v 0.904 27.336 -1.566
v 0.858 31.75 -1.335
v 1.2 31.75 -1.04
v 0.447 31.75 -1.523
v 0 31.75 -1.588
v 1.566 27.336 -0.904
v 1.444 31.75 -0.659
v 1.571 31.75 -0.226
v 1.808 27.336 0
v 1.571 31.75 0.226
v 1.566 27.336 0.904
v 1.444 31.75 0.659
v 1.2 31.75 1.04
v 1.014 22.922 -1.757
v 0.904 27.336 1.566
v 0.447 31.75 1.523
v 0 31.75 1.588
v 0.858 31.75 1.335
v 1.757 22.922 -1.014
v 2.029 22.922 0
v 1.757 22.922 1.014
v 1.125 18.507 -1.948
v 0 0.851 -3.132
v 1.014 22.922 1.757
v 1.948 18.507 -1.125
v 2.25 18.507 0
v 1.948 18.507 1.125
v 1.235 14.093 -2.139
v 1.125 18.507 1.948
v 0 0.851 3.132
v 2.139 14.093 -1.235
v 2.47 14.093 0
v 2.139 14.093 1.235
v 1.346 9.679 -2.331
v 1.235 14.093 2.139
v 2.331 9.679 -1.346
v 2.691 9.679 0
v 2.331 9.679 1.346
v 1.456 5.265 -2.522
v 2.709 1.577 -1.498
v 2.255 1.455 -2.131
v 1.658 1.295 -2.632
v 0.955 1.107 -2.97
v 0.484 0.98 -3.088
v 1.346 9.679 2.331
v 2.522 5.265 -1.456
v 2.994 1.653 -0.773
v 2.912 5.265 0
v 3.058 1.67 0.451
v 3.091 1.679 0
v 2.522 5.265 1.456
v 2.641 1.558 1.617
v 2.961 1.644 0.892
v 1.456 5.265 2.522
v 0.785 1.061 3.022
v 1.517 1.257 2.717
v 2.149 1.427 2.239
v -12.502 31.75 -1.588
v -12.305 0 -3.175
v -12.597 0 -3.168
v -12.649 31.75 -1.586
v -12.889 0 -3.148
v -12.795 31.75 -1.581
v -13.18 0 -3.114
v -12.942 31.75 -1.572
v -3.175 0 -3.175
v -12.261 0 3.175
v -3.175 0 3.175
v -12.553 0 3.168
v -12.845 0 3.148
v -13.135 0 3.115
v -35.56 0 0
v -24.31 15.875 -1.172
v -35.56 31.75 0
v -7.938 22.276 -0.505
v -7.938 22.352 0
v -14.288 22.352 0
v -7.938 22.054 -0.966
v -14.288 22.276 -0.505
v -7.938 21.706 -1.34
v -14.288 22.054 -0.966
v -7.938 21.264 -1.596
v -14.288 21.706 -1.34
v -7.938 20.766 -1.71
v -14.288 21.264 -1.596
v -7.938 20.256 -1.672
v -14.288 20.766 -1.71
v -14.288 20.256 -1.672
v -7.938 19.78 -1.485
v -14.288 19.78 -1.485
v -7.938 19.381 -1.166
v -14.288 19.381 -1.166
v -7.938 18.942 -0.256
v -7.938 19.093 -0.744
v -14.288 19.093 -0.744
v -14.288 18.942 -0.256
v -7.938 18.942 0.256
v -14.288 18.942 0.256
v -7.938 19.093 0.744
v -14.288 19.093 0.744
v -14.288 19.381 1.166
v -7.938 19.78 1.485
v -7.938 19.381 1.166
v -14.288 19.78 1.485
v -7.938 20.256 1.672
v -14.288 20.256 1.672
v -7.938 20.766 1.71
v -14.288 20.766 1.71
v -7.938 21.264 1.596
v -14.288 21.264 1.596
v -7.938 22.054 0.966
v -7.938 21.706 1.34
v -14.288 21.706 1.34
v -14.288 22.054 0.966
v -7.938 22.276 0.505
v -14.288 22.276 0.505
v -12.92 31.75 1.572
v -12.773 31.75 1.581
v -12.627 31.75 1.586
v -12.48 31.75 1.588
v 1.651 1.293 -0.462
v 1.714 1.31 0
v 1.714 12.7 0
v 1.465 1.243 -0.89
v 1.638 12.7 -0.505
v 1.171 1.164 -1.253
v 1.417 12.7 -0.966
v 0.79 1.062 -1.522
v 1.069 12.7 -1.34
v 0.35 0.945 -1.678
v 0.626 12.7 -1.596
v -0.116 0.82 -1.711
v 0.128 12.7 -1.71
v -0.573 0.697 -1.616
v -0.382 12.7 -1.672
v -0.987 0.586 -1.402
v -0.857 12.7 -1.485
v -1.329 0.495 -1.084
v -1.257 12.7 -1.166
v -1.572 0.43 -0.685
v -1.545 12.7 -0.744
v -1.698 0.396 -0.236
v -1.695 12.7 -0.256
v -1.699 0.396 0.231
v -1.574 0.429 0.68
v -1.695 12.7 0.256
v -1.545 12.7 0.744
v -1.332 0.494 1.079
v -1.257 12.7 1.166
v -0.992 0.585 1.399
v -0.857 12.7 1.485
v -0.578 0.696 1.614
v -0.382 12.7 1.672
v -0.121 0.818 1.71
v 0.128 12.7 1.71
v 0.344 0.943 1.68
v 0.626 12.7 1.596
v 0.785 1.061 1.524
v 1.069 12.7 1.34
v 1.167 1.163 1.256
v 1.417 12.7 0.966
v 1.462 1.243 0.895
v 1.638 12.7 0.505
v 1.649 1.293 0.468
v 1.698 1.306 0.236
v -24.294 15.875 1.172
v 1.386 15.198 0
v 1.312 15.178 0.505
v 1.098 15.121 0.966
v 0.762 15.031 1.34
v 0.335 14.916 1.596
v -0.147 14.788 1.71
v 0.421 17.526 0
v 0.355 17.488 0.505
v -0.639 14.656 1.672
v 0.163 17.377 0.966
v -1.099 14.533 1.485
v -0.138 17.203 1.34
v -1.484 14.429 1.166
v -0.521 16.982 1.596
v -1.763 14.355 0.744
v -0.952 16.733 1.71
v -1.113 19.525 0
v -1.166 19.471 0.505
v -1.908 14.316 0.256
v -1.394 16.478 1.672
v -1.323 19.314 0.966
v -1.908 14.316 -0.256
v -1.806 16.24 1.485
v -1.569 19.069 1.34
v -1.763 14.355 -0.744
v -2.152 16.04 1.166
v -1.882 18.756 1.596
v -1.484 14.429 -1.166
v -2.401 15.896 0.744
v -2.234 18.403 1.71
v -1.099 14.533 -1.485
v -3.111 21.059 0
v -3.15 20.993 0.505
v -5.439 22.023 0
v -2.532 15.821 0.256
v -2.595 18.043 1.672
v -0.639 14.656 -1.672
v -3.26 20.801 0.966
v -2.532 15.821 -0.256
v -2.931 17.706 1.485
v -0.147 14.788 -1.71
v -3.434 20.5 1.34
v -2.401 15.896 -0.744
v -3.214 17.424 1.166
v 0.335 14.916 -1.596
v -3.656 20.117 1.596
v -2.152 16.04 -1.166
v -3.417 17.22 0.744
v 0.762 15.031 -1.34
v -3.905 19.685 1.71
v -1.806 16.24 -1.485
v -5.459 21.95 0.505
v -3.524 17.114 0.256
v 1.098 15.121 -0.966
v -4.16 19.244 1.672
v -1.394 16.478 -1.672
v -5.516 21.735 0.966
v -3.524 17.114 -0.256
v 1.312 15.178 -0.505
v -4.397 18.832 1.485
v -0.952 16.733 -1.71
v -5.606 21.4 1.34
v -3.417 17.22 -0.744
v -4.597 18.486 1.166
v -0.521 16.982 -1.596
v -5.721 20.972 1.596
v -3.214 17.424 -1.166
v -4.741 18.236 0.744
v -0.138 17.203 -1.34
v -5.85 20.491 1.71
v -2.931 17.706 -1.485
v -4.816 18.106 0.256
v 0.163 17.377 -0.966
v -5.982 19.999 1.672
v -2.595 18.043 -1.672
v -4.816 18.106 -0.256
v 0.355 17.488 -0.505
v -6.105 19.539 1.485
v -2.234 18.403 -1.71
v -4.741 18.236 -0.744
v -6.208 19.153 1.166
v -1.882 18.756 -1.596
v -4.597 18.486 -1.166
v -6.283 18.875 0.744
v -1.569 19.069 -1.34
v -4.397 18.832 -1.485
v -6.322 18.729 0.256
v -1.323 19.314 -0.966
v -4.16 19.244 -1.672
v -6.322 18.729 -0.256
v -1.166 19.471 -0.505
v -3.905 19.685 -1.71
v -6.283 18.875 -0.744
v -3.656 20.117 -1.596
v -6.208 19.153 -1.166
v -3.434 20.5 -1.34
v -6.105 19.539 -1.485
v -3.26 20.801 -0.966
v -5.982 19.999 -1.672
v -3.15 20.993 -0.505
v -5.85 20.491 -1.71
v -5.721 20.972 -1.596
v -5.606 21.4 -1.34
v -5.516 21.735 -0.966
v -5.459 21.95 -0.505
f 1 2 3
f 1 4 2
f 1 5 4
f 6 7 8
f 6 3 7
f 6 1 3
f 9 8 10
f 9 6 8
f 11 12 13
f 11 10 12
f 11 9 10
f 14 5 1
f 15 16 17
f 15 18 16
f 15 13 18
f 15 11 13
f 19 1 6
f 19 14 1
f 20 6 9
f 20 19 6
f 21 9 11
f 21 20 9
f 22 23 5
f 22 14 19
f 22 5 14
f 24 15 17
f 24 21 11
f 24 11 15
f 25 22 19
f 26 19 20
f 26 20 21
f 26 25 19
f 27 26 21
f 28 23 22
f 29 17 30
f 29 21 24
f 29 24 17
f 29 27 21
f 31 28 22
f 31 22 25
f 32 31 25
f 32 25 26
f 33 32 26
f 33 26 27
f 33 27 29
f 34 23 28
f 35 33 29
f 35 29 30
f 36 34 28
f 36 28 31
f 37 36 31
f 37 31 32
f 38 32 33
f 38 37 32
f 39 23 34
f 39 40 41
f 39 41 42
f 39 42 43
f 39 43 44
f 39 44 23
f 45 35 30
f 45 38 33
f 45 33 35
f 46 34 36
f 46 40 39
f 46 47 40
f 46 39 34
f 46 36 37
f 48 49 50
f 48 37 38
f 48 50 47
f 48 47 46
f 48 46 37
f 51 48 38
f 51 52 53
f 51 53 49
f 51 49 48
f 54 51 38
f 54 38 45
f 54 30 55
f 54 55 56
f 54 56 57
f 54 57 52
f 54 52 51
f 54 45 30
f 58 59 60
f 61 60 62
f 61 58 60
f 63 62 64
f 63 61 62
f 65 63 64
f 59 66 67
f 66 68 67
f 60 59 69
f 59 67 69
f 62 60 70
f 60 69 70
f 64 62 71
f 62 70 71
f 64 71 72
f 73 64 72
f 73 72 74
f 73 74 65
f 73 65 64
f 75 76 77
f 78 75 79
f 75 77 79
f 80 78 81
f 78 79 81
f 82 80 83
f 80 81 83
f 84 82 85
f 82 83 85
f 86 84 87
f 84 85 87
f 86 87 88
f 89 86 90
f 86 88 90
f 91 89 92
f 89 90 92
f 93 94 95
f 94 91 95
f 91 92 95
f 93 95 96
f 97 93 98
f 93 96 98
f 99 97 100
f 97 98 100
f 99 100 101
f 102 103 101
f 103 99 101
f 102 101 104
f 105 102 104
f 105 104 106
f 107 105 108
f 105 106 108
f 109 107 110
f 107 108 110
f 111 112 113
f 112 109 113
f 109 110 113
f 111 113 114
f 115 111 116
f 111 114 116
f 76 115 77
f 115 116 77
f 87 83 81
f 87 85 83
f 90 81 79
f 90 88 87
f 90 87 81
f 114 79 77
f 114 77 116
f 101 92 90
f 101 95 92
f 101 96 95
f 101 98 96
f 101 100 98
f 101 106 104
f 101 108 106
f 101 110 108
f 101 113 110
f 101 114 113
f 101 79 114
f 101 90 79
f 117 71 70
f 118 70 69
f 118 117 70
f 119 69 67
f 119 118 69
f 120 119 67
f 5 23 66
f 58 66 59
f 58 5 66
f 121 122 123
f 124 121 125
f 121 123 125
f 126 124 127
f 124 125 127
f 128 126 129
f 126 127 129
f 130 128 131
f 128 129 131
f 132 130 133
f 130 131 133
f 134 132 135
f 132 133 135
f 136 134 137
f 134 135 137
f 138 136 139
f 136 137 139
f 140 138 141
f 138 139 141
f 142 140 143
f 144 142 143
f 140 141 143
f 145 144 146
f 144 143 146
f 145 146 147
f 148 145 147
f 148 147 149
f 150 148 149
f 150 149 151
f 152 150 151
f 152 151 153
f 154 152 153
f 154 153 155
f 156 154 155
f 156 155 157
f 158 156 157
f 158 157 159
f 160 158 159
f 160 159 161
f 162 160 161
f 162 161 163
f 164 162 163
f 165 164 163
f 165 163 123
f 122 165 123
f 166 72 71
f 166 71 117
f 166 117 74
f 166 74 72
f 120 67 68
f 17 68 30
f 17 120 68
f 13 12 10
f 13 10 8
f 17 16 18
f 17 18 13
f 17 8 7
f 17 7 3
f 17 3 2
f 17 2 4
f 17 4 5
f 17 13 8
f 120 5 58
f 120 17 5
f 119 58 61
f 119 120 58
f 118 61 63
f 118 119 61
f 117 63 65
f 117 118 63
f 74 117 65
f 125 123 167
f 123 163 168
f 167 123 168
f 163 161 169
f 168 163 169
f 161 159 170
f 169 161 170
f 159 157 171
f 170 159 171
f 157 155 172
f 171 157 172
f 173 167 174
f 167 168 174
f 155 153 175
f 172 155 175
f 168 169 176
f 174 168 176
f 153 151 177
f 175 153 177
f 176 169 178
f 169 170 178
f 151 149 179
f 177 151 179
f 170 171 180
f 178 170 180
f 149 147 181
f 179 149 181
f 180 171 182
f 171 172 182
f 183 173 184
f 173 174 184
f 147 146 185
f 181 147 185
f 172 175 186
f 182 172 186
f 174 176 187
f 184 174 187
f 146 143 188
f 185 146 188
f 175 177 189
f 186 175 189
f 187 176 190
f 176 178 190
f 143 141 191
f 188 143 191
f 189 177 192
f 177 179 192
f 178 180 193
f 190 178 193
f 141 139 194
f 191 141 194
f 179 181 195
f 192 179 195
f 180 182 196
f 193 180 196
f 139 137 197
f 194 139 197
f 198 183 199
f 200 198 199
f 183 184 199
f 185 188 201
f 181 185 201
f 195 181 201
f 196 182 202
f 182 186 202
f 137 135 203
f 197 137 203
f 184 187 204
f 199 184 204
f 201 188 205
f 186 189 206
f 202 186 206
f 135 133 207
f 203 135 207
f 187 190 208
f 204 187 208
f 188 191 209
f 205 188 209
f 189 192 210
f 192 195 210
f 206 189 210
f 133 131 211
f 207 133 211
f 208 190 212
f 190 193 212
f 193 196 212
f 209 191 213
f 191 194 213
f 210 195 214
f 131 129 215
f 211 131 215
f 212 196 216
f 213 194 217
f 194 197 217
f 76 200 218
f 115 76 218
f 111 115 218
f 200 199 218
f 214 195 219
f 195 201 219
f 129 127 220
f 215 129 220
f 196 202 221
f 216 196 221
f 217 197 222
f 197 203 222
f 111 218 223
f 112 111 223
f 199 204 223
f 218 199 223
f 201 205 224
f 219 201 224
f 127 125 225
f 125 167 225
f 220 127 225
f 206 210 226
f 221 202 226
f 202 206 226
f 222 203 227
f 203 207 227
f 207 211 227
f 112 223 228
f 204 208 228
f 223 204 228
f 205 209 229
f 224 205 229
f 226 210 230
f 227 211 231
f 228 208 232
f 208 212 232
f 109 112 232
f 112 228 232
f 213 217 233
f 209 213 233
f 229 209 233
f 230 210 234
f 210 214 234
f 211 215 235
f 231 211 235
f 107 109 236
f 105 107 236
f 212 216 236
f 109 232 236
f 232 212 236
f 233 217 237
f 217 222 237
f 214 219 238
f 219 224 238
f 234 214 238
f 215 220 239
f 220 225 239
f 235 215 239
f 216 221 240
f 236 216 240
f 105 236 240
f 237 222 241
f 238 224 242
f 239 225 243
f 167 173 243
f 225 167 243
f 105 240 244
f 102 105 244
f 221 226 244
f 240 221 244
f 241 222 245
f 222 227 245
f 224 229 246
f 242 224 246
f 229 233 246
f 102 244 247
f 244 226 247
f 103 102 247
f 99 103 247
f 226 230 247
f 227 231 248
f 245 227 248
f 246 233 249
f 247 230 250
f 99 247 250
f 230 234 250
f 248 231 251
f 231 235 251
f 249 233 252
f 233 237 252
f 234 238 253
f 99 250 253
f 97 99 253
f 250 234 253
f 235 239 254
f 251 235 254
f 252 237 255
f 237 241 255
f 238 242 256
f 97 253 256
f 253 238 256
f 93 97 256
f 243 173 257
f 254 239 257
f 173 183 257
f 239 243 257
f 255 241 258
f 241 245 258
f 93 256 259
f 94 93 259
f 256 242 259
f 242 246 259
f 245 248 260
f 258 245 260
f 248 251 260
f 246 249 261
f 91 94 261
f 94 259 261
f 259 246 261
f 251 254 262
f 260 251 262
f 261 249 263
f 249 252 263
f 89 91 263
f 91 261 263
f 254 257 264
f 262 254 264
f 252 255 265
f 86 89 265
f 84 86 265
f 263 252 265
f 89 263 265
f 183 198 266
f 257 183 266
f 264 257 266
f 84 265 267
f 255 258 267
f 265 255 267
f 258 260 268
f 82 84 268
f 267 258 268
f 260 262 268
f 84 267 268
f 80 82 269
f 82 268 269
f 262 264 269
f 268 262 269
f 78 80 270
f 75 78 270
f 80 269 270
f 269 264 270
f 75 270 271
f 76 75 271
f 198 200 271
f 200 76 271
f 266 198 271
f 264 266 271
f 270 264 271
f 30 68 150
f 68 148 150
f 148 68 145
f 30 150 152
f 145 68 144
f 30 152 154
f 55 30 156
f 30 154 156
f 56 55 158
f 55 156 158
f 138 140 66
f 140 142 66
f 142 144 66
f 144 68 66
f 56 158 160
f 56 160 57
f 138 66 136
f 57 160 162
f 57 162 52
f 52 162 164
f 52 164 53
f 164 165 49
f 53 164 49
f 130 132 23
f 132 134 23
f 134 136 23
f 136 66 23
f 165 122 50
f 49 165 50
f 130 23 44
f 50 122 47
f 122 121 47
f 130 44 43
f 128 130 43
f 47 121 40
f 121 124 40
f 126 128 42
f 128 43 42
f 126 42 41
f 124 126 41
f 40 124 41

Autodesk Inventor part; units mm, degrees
ref_plane "YZ Plane" through (0, 0, 0) normal (1, 0, 0) x (0, 1, 0)
ref_plane "XY Plane" through (0, 0, 0) normal (0, 0, 1) x (1, 0, 0)
sketch "Sketch2" plane through (0, 0, 0) normal (0, 1, 0) x (-1, 0, 0)
  circle A0 centre (0, 0) radius 3.175
  line L0 (0, 0) -> (35.56, 0)
  line L1 (0, 3.175) -> (12.2611, 3.175)
  line L2 (0, -3.175) -> (12.3047, -3.175)
  line L3 (13.1799, -3.1144) -> (35.56, 0)
  line L4 (35.56, 0) -> (13.1347, 3.1146)
  arc A1 (13.1347, 3.1146) -> (12.2611, 3.175) centre (12.2611, -3.175) ccw
  arc A2 (12.3047, -3.175) -> (13.1799, -3.1144) centre (12.3047, 3.175) ccw
  circle A3 centre (0, 0) radius 1.5875
  point P0 (12.7, 3.175)
  dimension "d5" = 6.35
  dimension "d6" = 35.56
  dimension "d7" = 12.7
  dimension "d8" = 6.35
  dimension "d9" = 6.35
  dimension "d12" = 3.175
ref_plane "Work Plane1" through (0, 31.75, 0) normal (0, 1, 0) x (-1, 0, 0)
sketch "Sketch3" plane through (0, 31.75, 0) normal (0, 1, 0) x (-1, 0, 0)
  circle A0 centre (0, 0) radius 1.5875
  line L0 (0, 1.5875) -> (12.4798, 1.5875)
  line L1 (0, -1.5875) -> (12.5018, -1.5875)
  line L2 (12.9421, -1.5722) -> (35.56, 0)
  line L3 (35.56, 0) -> (12.9197, 1.5722)
  arc A1 (12.9197, 1.5722) -> (12.4798, 1.5875) centre (12.4798, -4.7625) ccw
  arc A2 (12.5018, -1.5875) -> (12.9421, -1.5722) centre (12.5018, 4.7625) ccw
  point P0 (12.7, 1.5875)
  dimension "d14" = 3.175
  dimension "d15" = 12.7
  dimension "d16" = 6.35
  dimension "d17" = 6.35
loft "Loft1" add profiles "Sketch2", "Sketch3" contours A0 | L0 L3 A2 L2 A0 | A0 L1 A1 L4 L0 | A3 / all
sketch "Sketch4" plane through (0, 0, 0) normal (0, 0, 1) x (1, 0, 0)
  line L0 (-12.2611, 0) -> (0, 0) projected
  line L1 (0, 0) -> (0, 12.7)
  line L2 (0, 0) -> (0, 31.75) projected
  line L3 (0, 12.7) -> (-7.9375, 12.7)
  line L4 (-7.9375, 12.7) -> (-7.9375, 20.6375)
  arc A0 (0, 12.7) -> (-7.9375, 20.6375) centre (-7.9375, 12.7) ccw
  line L5 (-7.9375, 20.6375) -> (-14.2875, 20.6375)
  dimension "d22" = 12.7
  dimension "d23" = 7.9375
  dimension "d24" = 7.9375
  dimension "d25" = 6.35
sketch "Sketch5" plane through (-12.3047, 0, -3.175) normal (0, -1, 0) x (1, 0, 0)
  circle A0 centre (12.3047, 3.175) radius 1.7145
  dimension "d26" = 3.429
sweep "Sweep1" cut profiles "Sketch5" path "Sketch4" path curves L1 A0 L5
sketch "Sketch6" plane through (0, 0, 0) normal (0, 0, 1) x (1, 0, 0)
  line L0 (3.175, 0) -> (0, 0) projected
  line L1 (3.175, 0) -> (-3.175, 0)
  line L2 (0, 0) -> (-12.3047, 0) projected
  line L3 (-3.175, 0) -> (3.0911, 1.679)
  line L4 (3.175, 0) -> (1.5875, 31.75) projected
  dimension "d29" = 6.35
  dimension "d30" = 15
extrude "Extrusion3" cut sketch "Sketch6" along normal mid plane 25.4
properties part number "RudderLowerControlSurface"
